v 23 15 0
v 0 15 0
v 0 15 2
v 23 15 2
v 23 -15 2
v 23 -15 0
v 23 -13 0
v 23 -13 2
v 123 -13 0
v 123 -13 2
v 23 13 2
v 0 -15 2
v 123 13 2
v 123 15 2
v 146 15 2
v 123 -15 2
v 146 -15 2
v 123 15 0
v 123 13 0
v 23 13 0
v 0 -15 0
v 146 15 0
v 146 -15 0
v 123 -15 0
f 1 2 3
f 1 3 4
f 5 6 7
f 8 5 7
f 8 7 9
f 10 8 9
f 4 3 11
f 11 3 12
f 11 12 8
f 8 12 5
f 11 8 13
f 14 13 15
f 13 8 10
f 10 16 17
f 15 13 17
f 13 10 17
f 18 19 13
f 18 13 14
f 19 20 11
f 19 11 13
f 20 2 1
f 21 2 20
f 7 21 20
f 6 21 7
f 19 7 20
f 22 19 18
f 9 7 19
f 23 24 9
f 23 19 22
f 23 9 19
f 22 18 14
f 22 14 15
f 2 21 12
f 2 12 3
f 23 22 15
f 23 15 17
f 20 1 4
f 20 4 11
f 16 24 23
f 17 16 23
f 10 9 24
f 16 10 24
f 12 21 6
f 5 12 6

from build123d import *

# Parameters (mm, degrees)
BOSS_EXTRUDE1_DEPTH = 2


with BuildPart() as part:
    # Sketch1 → Boss-Extrude1 (new body)
    with BuildSketch(Plane.XY):
        Polygon((0, 0), (0, -15), (23, -15), (23, -13), (123, -13), (123, -15), (146, -15), (146, 0), align=None)
    boss_extrude1 = extrude(amount=BOSS_EXTRUDE1_DEPTH)

    # Mirror3: Boss-Extrude1 across plane
    add(boss_extrude1.mirror(Plane(origin=(0, 0, 2), x_dir=(0, 0, 1), z_dir=(0, -1, 0))))


solid = part.part
